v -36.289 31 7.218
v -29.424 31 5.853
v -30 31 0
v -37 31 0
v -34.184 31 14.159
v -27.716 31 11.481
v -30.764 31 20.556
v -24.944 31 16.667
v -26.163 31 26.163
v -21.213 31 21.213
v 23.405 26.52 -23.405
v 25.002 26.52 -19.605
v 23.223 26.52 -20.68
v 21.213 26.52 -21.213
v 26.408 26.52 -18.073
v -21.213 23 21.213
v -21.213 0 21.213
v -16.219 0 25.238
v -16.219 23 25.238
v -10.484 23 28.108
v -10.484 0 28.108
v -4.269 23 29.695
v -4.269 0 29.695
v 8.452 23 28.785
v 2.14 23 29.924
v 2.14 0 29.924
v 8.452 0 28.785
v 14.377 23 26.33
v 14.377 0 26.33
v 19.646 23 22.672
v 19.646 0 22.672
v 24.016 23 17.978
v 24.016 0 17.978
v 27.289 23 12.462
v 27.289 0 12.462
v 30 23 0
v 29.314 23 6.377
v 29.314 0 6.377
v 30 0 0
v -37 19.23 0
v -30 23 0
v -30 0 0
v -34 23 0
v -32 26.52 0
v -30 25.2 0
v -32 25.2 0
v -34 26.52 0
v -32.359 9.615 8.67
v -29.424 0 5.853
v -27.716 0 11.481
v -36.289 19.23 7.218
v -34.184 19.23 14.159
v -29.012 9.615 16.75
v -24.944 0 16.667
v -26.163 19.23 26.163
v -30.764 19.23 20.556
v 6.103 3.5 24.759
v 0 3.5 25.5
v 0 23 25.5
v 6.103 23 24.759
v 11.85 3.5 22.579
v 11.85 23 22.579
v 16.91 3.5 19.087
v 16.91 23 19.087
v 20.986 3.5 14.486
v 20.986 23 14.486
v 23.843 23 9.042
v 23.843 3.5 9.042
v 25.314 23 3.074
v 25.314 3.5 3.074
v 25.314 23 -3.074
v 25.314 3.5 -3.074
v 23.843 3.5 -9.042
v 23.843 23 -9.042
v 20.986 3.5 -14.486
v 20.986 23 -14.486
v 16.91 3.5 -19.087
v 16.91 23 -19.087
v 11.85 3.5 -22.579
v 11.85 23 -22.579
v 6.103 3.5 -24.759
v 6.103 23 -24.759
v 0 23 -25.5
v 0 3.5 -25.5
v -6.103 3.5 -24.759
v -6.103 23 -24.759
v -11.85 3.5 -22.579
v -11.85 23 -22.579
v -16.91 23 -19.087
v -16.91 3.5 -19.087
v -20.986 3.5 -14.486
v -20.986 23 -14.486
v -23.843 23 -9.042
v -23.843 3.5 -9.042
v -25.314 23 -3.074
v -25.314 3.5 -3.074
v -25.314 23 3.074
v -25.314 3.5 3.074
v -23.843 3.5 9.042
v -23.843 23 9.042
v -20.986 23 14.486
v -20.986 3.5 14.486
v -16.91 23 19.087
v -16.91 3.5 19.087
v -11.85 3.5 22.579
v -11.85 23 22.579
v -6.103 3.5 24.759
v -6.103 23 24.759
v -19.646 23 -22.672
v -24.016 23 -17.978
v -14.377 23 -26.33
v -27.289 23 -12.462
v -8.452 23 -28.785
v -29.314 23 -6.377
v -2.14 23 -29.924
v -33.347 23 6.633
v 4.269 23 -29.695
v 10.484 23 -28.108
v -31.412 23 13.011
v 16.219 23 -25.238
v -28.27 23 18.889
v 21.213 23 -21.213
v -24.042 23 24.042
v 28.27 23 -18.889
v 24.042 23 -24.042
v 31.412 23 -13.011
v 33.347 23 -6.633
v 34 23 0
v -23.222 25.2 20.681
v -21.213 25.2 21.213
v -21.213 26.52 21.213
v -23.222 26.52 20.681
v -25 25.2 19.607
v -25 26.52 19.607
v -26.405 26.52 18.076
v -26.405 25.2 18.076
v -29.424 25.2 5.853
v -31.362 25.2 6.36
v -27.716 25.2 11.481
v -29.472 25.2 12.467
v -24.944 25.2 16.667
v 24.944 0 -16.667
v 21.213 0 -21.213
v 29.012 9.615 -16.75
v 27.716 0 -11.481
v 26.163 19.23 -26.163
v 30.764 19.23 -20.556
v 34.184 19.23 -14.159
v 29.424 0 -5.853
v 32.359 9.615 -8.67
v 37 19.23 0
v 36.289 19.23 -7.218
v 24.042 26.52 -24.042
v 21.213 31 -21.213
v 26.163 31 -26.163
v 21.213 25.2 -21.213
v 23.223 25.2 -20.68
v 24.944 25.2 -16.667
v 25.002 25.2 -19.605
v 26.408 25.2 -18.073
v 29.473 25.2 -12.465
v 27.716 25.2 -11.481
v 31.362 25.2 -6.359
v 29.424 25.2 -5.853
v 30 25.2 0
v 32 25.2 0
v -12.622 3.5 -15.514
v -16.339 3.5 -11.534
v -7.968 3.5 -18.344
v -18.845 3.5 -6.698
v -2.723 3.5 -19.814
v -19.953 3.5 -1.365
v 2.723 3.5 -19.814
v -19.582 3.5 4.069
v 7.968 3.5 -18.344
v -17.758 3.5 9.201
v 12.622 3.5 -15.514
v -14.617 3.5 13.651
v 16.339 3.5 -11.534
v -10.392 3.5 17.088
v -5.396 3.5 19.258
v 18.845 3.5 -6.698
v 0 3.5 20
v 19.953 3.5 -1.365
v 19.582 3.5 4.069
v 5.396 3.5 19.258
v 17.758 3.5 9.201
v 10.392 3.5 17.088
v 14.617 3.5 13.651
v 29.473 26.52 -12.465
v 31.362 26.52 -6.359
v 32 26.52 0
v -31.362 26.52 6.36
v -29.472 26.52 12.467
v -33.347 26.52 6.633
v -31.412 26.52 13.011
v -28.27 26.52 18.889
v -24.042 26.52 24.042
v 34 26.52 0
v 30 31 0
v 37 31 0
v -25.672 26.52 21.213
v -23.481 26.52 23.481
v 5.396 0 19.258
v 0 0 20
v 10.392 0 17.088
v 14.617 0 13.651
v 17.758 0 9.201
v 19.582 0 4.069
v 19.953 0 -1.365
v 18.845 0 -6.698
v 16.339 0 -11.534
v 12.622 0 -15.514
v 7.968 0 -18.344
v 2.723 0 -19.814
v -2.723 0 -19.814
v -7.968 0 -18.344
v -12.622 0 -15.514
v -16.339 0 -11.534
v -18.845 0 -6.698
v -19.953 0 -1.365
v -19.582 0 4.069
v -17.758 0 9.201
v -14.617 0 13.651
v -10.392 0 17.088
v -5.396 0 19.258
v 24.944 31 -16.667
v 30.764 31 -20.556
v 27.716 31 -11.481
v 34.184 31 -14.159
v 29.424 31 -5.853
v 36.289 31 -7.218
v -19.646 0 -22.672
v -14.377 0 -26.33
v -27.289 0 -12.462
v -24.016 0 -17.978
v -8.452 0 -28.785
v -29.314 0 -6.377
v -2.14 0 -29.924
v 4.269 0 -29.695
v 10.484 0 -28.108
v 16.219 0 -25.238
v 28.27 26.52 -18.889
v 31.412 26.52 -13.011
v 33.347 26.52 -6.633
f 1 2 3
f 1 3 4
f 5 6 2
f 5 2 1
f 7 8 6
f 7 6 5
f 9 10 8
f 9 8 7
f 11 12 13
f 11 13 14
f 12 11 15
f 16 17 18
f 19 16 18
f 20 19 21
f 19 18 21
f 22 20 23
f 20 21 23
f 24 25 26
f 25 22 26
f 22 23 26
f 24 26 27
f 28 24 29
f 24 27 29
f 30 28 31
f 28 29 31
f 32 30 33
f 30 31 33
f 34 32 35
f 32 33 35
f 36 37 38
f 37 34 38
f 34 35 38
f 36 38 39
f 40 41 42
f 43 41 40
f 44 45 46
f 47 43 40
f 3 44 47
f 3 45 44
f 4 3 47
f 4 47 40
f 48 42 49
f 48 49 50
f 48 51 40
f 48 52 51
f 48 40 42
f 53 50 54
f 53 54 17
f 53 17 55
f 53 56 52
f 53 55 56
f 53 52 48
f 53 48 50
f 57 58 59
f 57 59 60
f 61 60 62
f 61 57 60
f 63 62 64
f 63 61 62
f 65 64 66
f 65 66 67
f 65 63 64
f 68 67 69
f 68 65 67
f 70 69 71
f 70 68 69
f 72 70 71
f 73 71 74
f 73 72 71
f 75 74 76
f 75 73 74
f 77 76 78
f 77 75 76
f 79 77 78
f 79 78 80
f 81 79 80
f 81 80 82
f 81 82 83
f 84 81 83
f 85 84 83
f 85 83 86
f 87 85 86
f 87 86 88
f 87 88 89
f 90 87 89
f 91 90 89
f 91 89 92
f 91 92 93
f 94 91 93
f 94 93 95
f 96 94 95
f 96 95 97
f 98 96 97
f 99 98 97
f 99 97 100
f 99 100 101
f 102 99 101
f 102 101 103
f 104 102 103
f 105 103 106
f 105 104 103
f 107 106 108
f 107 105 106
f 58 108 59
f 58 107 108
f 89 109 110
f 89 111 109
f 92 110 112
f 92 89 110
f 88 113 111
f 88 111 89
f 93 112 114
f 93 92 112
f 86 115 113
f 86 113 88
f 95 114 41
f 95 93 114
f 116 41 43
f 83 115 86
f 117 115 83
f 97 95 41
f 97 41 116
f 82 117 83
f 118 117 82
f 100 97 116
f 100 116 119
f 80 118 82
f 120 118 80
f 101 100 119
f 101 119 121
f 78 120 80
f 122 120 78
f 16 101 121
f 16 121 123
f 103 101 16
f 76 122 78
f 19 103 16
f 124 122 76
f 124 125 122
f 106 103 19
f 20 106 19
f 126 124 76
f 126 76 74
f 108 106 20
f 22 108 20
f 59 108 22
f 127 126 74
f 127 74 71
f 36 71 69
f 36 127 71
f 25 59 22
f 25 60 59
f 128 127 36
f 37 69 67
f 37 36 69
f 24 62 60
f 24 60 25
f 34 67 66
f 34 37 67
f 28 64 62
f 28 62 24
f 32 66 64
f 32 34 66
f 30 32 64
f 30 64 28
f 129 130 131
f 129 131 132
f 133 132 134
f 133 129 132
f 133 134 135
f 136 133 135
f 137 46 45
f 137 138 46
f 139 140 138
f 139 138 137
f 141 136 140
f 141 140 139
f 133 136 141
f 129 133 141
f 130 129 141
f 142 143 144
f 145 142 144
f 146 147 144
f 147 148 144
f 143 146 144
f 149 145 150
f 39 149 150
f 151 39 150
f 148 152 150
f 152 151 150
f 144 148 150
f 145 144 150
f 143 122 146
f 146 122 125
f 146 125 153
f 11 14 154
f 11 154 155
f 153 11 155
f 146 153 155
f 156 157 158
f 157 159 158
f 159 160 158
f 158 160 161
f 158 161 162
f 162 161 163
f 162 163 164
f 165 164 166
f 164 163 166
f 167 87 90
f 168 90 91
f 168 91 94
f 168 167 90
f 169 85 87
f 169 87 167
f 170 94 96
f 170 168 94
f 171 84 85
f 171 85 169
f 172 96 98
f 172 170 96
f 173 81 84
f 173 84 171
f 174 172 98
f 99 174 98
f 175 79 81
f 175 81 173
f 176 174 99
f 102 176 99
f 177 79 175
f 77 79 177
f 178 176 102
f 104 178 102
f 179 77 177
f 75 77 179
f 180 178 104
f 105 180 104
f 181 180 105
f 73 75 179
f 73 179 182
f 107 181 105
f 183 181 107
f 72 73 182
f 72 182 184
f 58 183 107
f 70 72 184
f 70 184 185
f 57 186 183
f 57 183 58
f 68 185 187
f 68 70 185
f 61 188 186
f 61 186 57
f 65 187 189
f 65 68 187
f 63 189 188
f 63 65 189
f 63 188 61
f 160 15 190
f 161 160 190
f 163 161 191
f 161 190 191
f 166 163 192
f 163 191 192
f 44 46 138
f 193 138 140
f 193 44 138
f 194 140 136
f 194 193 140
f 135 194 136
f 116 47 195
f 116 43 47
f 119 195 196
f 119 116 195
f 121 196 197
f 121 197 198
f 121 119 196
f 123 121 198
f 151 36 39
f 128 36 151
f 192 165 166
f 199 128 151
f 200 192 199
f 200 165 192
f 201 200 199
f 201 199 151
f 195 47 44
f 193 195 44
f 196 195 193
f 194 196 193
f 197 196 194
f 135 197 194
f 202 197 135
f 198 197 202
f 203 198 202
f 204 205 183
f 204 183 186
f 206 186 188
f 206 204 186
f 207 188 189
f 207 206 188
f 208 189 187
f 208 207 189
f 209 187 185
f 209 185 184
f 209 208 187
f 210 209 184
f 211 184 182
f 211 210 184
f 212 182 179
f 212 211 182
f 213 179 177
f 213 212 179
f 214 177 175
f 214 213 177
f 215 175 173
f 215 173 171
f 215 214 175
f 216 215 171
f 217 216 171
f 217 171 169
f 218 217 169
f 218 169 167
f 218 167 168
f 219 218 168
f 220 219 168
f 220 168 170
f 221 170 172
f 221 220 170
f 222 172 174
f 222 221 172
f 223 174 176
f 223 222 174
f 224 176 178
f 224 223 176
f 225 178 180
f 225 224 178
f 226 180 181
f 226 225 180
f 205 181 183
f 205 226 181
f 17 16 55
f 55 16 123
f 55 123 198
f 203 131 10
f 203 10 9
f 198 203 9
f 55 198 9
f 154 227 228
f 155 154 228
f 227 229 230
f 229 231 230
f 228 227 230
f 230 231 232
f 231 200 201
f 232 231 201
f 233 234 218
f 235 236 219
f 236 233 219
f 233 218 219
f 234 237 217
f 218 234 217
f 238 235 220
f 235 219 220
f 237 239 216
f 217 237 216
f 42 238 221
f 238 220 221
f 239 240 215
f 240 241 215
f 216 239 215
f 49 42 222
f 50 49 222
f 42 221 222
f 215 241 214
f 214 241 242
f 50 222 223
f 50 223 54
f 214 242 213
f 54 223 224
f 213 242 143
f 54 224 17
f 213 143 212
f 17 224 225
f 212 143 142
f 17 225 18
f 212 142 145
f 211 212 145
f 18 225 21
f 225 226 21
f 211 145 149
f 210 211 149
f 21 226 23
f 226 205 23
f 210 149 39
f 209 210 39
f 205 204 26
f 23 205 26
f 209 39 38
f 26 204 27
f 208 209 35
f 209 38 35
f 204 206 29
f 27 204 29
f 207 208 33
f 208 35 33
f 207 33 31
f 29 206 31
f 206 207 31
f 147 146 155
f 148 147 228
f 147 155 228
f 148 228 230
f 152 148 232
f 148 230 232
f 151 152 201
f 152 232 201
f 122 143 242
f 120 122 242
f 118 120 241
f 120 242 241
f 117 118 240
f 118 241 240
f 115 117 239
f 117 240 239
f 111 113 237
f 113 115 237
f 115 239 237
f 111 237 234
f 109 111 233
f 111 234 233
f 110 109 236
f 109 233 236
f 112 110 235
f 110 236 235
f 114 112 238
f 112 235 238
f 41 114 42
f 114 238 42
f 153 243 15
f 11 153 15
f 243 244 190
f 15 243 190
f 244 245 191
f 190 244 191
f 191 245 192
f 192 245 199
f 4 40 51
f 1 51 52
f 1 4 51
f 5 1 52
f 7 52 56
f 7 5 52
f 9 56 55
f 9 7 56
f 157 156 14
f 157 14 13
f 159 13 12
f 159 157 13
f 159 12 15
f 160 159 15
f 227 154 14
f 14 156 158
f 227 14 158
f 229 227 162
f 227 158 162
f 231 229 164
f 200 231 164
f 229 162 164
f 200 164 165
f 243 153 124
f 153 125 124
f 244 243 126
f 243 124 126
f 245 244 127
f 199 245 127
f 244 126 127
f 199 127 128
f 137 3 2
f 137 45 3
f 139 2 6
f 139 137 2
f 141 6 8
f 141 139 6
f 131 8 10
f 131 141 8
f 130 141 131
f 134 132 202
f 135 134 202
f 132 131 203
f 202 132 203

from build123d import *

# Parameters (mm, degrees)
SKETCH_1_R          = 30
SKETCH_1_R_2        = 25.5
EXTRUDE_1_DEPTH     = 23
SKETCH_2_R          = 25.5
SKETCH_2_R_2        = 20
EXTRUDE_2_DEPTH     = 3.5
REVOLVE_1_ANGLE     = 45
CUT_EXTRUDE_1_DEPTH = 1.32
CUT_EXTRUDE_3_DEPTH = 1.32


with BuildPart() as part:
    # 草图1 → 凸台-拉伸1 (new body)
    with BuildSketch(Plane(origin=(0, 0, 0), x_dir=(1, 0, 0), z_dir=(0, 1, 0))):
        with Locations(Location((0, 0, 0), (0, 0, 270))):
            Circle(SKETCH_1_R)
        with Locations(Location((0, 0, 0), (0, 0, 270))):
            Circle(SKETCH_1_R_2, mode=Mode.SUBTRACT)
    extrude(amount=EXTRUDE_1_DEPTH)

    # 草图2 → 凸台-拉伸2 (add)
    with BuildSketch(Plane(origin=(0, 0, 0), x_dir=(1, 0, 0), z_dir=(0, 1, 0))):
        with Locations(Location((0, 0, 0), (0, 0, 270))):
            Circle(SKETCH_2_R)
        with Locations(Location((0, 0, 0), (0, 0, 270))):
            Circle(SKETCH_2_R_2, mode=Mode.SUBTRACT)
    extrude(amount=EXTRUDE_2_DEPTH)

    # 草图3 → 旋转1 (revolve)
    with BuildSketch(Plane.XY):
        Polygon((-30, 0), (-37, 19.23), (-37, 31), (-30, 31), (-30, 25.2), (-32, 25.2), (-32, 26.519651463), (-34, 26.519651463), (-34, 23), (-30, 23), align=None)
    revolve_1 = revolve(axis=Axis((0, 0, 0), (0, 1, 0)), revolution_arc=REVOLVE_1_ANGLE)

    # 镜向1: 旋转1 across plane
    add(revolve_1.mirror(Plane(origin=(0, 0, 0), x_dir=(0.3826834323650901, 0, 0.9238795325112866), z_dir=(0.9238795325112867, 0, -0.38268343236509006))))

    # 草图5 → 切除-拉伸1 (cut)
    with BuildSketch(Plane.XZ.offset(-25.2)):
        with BuildLine():
            Line((-26.405413435, 18.076342033), (-25.672211093, 21.213203436))
            Line((-25.672211093, 21.213203436), (-22.063062958, 24.949941075))
            Line((-22.063062958, 24.949941075), (-17.99117048, 21.673033438))
            Line((-17.99117048, 21.673033438), (-21.213203436, 21.213203436))
            ThreePointArc((-21.213203436, 21.213203436), (-24.149079473, 20.207170096), (-26.405413435, 18.076342033))
        make_face()
    extrude(amount=-CUT_EXTRUDE_1_DEPTH, mode=Mode.SUBTRACT)

    # 草图8 → 切除-拉伸3 (cut)
    with BuildSketch(Plane.XZ.offset(-25.2)):
        with BuildLine():
            Line((26.407763212, -18.072909066), (22.874853187, -24.345219229))
            Line((22.874853187, -24.345219229), (19.318976471, -22.342353909))
            Line((19.318976471, -22.342353909), (21.213203436, -21.213203436))
            ThreePointArc((21.213203436, -21.213203436), (24.150606635, -20.205675758), (26.407763212, -18.072909066))
        make_face()
    extrude(amount=-CUT_EXTRUDE_3_DEPTH, mode=Mode.SUBTRACT)


solid = part.part
